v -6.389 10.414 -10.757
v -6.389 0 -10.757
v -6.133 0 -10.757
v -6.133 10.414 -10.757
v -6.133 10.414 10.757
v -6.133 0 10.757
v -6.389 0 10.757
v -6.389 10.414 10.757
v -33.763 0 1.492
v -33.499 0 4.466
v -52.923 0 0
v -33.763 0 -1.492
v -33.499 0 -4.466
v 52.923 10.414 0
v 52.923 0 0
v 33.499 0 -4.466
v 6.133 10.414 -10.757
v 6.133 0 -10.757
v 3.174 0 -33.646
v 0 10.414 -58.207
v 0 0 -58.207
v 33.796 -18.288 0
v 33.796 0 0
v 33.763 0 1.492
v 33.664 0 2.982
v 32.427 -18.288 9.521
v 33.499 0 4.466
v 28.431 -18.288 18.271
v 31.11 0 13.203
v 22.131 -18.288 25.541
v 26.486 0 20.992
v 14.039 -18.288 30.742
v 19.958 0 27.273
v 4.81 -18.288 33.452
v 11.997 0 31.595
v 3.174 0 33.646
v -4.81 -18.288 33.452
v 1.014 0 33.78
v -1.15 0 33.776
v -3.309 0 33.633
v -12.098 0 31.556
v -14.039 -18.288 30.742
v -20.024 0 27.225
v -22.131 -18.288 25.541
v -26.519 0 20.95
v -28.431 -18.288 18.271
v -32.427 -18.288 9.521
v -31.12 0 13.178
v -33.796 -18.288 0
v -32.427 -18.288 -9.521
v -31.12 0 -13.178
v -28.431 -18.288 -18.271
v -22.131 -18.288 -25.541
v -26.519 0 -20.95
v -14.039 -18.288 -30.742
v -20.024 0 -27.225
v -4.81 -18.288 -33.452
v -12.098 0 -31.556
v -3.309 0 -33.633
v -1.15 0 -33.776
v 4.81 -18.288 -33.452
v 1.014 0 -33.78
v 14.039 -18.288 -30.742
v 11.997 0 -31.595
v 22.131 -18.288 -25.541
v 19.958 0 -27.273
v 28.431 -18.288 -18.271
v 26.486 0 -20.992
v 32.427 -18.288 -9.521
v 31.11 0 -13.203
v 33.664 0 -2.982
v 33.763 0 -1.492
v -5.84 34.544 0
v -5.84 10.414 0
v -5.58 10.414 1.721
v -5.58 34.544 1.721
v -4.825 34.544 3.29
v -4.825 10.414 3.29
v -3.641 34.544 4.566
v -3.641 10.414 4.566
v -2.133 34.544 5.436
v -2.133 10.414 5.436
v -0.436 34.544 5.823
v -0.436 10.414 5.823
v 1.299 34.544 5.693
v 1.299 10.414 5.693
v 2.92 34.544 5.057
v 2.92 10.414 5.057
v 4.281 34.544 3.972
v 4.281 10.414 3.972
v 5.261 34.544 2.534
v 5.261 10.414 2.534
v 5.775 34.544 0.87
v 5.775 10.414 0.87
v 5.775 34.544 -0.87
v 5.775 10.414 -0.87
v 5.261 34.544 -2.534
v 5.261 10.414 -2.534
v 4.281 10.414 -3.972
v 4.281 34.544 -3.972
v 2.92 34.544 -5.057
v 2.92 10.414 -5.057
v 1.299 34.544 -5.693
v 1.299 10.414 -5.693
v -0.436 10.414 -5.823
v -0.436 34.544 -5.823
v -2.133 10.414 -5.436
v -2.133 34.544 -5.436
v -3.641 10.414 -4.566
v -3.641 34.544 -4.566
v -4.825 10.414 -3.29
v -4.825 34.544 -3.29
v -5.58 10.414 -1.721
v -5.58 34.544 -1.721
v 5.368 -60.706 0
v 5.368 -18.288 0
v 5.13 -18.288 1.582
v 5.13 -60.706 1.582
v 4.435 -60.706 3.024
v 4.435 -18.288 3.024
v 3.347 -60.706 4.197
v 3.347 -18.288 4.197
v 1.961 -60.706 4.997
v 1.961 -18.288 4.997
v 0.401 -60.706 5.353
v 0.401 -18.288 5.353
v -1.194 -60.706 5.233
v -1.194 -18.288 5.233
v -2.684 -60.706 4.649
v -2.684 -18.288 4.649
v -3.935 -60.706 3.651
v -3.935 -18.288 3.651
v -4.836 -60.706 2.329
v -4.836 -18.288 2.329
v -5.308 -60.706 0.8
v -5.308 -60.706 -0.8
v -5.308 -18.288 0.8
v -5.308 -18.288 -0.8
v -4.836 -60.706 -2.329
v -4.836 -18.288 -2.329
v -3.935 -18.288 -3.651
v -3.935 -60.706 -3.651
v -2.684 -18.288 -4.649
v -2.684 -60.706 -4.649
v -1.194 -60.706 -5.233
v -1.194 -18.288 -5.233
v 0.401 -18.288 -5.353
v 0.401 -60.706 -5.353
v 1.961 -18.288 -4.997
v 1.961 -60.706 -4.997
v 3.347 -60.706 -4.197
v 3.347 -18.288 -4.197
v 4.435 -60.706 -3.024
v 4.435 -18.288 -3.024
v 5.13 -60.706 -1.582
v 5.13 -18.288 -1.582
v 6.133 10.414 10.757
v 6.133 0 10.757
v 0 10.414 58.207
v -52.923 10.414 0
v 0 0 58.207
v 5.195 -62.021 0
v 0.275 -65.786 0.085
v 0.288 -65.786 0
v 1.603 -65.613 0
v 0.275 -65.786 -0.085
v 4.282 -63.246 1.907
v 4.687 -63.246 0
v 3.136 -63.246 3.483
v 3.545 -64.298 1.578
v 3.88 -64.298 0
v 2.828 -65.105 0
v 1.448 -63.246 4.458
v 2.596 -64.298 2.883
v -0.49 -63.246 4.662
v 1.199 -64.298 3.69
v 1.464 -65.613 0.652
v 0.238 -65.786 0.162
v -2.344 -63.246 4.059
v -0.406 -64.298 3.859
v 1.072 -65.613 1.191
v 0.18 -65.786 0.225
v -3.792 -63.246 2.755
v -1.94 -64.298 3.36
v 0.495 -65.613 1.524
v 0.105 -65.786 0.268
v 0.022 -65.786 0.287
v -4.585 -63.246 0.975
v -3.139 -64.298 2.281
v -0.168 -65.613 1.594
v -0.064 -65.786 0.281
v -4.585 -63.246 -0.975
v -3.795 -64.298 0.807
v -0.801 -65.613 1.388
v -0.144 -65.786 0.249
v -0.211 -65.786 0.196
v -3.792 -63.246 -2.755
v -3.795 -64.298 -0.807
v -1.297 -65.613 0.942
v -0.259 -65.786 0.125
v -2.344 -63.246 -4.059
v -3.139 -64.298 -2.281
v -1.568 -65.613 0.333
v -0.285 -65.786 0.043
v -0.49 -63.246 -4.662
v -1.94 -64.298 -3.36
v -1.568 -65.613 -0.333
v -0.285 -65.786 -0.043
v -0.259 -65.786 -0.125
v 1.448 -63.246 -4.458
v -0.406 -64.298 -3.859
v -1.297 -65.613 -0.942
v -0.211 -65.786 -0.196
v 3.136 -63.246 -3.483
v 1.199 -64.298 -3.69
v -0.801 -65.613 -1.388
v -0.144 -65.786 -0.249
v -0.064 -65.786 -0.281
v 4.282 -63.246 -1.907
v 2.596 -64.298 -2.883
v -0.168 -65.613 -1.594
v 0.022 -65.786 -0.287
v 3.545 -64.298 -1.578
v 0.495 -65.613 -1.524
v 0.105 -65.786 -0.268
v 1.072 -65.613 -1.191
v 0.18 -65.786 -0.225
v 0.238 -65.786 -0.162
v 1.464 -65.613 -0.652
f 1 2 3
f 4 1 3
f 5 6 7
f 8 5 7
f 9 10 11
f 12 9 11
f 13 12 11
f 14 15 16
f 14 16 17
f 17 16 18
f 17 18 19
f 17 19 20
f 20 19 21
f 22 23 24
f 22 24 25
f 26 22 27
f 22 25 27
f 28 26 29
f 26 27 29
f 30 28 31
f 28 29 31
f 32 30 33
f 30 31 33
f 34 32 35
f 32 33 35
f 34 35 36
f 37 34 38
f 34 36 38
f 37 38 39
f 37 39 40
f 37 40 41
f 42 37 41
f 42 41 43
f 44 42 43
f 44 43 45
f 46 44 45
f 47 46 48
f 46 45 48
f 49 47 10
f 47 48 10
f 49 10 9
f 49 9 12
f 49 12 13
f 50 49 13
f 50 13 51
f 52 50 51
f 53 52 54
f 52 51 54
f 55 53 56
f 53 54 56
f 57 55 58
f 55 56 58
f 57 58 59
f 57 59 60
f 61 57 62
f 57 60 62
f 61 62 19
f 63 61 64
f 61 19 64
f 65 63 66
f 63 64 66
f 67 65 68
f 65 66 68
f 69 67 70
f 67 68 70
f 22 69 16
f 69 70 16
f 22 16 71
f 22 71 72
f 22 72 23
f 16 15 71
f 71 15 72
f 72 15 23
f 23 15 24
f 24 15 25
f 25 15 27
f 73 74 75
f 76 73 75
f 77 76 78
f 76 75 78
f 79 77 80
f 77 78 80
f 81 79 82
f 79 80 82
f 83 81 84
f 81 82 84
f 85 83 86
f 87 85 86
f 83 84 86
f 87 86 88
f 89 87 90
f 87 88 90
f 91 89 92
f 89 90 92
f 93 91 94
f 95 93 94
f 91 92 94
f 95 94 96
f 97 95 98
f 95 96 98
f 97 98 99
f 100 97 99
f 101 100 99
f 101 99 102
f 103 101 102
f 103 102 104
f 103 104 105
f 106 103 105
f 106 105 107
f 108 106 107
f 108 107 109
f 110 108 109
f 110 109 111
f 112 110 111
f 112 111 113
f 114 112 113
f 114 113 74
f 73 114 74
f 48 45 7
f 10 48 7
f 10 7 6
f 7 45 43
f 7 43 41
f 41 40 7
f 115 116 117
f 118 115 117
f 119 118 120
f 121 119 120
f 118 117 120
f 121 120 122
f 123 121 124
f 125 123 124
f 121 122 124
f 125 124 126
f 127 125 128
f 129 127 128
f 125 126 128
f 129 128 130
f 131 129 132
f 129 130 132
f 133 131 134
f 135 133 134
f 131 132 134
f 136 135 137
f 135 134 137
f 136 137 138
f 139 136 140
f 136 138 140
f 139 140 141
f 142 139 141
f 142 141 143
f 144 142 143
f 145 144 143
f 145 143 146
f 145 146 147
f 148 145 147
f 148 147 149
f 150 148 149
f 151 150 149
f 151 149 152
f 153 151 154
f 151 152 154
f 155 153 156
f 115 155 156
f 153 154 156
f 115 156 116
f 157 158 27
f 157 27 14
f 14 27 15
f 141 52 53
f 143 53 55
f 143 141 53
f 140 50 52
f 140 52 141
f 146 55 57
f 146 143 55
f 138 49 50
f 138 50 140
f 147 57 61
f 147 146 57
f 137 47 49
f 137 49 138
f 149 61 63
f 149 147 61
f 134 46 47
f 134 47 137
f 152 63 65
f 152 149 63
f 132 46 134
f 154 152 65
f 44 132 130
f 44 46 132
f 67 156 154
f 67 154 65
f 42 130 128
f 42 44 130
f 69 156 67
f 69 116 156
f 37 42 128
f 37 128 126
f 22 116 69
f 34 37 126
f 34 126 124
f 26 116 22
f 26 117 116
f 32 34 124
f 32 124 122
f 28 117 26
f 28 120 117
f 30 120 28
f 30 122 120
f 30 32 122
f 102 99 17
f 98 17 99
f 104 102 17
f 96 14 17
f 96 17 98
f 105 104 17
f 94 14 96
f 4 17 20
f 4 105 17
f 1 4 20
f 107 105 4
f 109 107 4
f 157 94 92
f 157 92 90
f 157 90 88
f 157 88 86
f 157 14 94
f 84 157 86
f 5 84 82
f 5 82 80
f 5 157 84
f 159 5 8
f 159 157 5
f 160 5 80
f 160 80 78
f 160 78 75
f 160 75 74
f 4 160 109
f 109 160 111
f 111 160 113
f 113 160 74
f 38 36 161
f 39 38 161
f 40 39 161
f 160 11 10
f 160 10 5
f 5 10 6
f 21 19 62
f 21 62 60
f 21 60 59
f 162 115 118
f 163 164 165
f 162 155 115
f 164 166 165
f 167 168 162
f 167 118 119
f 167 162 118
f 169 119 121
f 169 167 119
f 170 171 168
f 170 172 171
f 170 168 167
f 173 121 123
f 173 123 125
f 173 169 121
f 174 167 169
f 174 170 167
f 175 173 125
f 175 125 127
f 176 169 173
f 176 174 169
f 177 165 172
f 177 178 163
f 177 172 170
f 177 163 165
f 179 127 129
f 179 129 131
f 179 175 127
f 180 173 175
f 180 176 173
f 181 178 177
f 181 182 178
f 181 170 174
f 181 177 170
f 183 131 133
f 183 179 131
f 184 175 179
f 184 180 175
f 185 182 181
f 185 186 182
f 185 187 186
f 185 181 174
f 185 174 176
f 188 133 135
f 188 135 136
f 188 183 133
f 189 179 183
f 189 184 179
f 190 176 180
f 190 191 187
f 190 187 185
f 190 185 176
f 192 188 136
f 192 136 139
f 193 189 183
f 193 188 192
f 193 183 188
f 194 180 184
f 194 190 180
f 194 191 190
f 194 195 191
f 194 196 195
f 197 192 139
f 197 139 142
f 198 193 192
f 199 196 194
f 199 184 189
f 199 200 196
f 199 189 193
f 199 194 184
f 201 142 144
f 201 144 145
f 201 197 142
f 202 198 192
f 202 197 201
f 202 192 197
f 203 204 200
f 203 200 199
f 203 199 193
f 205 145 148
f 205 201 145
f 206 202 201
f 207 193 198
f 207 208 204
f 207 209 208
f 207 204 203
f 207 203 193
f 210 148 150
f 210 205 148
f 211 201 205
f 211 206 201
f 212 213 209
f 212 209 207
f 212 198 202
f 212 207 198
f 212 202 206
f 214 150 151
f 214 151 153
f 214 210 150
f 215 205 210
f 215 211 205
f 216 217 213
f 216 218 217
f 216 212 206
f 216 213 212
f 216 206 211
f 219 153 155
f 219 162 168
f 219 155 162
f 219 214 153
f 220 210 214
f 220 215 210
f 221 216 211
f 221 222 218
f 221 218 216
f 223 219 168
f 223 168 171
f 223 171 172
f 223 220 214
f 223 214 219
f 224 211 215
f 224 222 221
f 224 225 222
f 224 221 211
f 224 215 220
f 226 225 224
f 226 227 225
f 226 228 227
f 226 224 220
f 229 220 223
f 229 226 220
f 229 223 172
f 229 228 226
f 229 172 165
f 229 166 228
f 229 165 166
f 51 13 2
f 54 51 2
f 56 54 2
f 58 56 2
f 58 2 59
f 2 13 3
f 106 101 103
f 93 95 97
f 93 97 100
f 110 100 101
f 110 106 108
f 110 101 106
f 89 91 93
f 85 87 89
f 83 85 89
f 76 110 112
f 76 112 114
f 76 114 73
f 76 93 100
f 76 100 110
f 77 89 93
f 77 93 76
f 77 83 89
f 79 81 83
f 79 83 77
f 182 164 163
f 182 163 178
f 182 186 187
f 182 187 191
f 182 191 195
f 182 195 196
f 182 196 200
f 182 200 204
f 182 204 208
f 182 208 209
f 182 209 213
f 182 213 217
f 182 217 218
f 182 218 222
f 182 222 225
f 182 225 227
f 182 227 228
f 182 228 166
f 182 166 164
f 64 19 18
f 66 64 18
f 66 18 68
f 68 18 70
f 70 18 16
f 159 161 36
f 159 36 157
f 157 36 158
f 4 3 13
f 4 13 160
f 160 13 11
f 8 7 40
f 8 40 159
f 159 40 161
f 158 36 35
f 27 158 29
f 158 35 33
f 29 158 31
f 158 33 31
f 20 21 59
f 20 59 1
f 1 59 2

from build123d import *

# Parameters (mm, degrees)
F0_R     = 33.795708
F1_DEPTH = 18.288
F2_R     = 5.368013
F3_DEPTH = 47.498
F4_R     = 5.08
F5_R     = 5.839733
F6_DEPTH = 34.544
F7_W     = 12.265376
F7_H     = 21.514286
F8_DEPTH = 10.414


with BuildPart() as f1:
    # F0 (on Front) → F1 (new body)
    with BuildSketch(Plane.XZ):
        Circle(F0_R)
    extrude(amount=F1_DEPTH)

    # F2 (on face) → F3 (join)
    with BuildSketch(Plane.XZ.offset(18.288)):
        Circle(F2_R)
    extrude(amount=F3_DEPTH)

    # F4
    f4_edges = [f1.edges().sort_by_distance(p)[0] for p in [
        (-5.368013, -65.786, 0),
    ]]
    fillet(f4_edges, radius=F4_R)

    # F5 (on face) → F6 (join)
    with BuildSketch(Plane(origin=(0, 0, 0), x_dir=(-1, 0, 0), z_dir=(0, 1, 0))):
        Circle(F5_R)
    extrude(amount=F6_DEPTH)

    # F7 (on face) → F8 (join)
    with BuildSketch(Plane(origin=(0, 0, 0), x_dir=(-1, 0, 0), z_dir=(0, 1, 0))):
        Polygon((-52.923243, 0), (-6.132688, -10.757143), (-6.132688, 10.757143), align=None)
        Polygon((6.132688, -10.757143), (-6.132688, -10.757143), (0, -58.2073), (6.389142, -10.757143), align=None)
        Rectangle(F7_W, F7_H)
        Polygon((6.132688, 10.757143), (6.132688, -10.757143), (52.923243, 0), align=None)
        Polygon((0, 58.2073), (-6.132688, 10.757143), (6.132688, 10.757143), (6.389142, 10.757143), align=None)
    extrude(amount=F8_DEPTH)


solid = f1.part
